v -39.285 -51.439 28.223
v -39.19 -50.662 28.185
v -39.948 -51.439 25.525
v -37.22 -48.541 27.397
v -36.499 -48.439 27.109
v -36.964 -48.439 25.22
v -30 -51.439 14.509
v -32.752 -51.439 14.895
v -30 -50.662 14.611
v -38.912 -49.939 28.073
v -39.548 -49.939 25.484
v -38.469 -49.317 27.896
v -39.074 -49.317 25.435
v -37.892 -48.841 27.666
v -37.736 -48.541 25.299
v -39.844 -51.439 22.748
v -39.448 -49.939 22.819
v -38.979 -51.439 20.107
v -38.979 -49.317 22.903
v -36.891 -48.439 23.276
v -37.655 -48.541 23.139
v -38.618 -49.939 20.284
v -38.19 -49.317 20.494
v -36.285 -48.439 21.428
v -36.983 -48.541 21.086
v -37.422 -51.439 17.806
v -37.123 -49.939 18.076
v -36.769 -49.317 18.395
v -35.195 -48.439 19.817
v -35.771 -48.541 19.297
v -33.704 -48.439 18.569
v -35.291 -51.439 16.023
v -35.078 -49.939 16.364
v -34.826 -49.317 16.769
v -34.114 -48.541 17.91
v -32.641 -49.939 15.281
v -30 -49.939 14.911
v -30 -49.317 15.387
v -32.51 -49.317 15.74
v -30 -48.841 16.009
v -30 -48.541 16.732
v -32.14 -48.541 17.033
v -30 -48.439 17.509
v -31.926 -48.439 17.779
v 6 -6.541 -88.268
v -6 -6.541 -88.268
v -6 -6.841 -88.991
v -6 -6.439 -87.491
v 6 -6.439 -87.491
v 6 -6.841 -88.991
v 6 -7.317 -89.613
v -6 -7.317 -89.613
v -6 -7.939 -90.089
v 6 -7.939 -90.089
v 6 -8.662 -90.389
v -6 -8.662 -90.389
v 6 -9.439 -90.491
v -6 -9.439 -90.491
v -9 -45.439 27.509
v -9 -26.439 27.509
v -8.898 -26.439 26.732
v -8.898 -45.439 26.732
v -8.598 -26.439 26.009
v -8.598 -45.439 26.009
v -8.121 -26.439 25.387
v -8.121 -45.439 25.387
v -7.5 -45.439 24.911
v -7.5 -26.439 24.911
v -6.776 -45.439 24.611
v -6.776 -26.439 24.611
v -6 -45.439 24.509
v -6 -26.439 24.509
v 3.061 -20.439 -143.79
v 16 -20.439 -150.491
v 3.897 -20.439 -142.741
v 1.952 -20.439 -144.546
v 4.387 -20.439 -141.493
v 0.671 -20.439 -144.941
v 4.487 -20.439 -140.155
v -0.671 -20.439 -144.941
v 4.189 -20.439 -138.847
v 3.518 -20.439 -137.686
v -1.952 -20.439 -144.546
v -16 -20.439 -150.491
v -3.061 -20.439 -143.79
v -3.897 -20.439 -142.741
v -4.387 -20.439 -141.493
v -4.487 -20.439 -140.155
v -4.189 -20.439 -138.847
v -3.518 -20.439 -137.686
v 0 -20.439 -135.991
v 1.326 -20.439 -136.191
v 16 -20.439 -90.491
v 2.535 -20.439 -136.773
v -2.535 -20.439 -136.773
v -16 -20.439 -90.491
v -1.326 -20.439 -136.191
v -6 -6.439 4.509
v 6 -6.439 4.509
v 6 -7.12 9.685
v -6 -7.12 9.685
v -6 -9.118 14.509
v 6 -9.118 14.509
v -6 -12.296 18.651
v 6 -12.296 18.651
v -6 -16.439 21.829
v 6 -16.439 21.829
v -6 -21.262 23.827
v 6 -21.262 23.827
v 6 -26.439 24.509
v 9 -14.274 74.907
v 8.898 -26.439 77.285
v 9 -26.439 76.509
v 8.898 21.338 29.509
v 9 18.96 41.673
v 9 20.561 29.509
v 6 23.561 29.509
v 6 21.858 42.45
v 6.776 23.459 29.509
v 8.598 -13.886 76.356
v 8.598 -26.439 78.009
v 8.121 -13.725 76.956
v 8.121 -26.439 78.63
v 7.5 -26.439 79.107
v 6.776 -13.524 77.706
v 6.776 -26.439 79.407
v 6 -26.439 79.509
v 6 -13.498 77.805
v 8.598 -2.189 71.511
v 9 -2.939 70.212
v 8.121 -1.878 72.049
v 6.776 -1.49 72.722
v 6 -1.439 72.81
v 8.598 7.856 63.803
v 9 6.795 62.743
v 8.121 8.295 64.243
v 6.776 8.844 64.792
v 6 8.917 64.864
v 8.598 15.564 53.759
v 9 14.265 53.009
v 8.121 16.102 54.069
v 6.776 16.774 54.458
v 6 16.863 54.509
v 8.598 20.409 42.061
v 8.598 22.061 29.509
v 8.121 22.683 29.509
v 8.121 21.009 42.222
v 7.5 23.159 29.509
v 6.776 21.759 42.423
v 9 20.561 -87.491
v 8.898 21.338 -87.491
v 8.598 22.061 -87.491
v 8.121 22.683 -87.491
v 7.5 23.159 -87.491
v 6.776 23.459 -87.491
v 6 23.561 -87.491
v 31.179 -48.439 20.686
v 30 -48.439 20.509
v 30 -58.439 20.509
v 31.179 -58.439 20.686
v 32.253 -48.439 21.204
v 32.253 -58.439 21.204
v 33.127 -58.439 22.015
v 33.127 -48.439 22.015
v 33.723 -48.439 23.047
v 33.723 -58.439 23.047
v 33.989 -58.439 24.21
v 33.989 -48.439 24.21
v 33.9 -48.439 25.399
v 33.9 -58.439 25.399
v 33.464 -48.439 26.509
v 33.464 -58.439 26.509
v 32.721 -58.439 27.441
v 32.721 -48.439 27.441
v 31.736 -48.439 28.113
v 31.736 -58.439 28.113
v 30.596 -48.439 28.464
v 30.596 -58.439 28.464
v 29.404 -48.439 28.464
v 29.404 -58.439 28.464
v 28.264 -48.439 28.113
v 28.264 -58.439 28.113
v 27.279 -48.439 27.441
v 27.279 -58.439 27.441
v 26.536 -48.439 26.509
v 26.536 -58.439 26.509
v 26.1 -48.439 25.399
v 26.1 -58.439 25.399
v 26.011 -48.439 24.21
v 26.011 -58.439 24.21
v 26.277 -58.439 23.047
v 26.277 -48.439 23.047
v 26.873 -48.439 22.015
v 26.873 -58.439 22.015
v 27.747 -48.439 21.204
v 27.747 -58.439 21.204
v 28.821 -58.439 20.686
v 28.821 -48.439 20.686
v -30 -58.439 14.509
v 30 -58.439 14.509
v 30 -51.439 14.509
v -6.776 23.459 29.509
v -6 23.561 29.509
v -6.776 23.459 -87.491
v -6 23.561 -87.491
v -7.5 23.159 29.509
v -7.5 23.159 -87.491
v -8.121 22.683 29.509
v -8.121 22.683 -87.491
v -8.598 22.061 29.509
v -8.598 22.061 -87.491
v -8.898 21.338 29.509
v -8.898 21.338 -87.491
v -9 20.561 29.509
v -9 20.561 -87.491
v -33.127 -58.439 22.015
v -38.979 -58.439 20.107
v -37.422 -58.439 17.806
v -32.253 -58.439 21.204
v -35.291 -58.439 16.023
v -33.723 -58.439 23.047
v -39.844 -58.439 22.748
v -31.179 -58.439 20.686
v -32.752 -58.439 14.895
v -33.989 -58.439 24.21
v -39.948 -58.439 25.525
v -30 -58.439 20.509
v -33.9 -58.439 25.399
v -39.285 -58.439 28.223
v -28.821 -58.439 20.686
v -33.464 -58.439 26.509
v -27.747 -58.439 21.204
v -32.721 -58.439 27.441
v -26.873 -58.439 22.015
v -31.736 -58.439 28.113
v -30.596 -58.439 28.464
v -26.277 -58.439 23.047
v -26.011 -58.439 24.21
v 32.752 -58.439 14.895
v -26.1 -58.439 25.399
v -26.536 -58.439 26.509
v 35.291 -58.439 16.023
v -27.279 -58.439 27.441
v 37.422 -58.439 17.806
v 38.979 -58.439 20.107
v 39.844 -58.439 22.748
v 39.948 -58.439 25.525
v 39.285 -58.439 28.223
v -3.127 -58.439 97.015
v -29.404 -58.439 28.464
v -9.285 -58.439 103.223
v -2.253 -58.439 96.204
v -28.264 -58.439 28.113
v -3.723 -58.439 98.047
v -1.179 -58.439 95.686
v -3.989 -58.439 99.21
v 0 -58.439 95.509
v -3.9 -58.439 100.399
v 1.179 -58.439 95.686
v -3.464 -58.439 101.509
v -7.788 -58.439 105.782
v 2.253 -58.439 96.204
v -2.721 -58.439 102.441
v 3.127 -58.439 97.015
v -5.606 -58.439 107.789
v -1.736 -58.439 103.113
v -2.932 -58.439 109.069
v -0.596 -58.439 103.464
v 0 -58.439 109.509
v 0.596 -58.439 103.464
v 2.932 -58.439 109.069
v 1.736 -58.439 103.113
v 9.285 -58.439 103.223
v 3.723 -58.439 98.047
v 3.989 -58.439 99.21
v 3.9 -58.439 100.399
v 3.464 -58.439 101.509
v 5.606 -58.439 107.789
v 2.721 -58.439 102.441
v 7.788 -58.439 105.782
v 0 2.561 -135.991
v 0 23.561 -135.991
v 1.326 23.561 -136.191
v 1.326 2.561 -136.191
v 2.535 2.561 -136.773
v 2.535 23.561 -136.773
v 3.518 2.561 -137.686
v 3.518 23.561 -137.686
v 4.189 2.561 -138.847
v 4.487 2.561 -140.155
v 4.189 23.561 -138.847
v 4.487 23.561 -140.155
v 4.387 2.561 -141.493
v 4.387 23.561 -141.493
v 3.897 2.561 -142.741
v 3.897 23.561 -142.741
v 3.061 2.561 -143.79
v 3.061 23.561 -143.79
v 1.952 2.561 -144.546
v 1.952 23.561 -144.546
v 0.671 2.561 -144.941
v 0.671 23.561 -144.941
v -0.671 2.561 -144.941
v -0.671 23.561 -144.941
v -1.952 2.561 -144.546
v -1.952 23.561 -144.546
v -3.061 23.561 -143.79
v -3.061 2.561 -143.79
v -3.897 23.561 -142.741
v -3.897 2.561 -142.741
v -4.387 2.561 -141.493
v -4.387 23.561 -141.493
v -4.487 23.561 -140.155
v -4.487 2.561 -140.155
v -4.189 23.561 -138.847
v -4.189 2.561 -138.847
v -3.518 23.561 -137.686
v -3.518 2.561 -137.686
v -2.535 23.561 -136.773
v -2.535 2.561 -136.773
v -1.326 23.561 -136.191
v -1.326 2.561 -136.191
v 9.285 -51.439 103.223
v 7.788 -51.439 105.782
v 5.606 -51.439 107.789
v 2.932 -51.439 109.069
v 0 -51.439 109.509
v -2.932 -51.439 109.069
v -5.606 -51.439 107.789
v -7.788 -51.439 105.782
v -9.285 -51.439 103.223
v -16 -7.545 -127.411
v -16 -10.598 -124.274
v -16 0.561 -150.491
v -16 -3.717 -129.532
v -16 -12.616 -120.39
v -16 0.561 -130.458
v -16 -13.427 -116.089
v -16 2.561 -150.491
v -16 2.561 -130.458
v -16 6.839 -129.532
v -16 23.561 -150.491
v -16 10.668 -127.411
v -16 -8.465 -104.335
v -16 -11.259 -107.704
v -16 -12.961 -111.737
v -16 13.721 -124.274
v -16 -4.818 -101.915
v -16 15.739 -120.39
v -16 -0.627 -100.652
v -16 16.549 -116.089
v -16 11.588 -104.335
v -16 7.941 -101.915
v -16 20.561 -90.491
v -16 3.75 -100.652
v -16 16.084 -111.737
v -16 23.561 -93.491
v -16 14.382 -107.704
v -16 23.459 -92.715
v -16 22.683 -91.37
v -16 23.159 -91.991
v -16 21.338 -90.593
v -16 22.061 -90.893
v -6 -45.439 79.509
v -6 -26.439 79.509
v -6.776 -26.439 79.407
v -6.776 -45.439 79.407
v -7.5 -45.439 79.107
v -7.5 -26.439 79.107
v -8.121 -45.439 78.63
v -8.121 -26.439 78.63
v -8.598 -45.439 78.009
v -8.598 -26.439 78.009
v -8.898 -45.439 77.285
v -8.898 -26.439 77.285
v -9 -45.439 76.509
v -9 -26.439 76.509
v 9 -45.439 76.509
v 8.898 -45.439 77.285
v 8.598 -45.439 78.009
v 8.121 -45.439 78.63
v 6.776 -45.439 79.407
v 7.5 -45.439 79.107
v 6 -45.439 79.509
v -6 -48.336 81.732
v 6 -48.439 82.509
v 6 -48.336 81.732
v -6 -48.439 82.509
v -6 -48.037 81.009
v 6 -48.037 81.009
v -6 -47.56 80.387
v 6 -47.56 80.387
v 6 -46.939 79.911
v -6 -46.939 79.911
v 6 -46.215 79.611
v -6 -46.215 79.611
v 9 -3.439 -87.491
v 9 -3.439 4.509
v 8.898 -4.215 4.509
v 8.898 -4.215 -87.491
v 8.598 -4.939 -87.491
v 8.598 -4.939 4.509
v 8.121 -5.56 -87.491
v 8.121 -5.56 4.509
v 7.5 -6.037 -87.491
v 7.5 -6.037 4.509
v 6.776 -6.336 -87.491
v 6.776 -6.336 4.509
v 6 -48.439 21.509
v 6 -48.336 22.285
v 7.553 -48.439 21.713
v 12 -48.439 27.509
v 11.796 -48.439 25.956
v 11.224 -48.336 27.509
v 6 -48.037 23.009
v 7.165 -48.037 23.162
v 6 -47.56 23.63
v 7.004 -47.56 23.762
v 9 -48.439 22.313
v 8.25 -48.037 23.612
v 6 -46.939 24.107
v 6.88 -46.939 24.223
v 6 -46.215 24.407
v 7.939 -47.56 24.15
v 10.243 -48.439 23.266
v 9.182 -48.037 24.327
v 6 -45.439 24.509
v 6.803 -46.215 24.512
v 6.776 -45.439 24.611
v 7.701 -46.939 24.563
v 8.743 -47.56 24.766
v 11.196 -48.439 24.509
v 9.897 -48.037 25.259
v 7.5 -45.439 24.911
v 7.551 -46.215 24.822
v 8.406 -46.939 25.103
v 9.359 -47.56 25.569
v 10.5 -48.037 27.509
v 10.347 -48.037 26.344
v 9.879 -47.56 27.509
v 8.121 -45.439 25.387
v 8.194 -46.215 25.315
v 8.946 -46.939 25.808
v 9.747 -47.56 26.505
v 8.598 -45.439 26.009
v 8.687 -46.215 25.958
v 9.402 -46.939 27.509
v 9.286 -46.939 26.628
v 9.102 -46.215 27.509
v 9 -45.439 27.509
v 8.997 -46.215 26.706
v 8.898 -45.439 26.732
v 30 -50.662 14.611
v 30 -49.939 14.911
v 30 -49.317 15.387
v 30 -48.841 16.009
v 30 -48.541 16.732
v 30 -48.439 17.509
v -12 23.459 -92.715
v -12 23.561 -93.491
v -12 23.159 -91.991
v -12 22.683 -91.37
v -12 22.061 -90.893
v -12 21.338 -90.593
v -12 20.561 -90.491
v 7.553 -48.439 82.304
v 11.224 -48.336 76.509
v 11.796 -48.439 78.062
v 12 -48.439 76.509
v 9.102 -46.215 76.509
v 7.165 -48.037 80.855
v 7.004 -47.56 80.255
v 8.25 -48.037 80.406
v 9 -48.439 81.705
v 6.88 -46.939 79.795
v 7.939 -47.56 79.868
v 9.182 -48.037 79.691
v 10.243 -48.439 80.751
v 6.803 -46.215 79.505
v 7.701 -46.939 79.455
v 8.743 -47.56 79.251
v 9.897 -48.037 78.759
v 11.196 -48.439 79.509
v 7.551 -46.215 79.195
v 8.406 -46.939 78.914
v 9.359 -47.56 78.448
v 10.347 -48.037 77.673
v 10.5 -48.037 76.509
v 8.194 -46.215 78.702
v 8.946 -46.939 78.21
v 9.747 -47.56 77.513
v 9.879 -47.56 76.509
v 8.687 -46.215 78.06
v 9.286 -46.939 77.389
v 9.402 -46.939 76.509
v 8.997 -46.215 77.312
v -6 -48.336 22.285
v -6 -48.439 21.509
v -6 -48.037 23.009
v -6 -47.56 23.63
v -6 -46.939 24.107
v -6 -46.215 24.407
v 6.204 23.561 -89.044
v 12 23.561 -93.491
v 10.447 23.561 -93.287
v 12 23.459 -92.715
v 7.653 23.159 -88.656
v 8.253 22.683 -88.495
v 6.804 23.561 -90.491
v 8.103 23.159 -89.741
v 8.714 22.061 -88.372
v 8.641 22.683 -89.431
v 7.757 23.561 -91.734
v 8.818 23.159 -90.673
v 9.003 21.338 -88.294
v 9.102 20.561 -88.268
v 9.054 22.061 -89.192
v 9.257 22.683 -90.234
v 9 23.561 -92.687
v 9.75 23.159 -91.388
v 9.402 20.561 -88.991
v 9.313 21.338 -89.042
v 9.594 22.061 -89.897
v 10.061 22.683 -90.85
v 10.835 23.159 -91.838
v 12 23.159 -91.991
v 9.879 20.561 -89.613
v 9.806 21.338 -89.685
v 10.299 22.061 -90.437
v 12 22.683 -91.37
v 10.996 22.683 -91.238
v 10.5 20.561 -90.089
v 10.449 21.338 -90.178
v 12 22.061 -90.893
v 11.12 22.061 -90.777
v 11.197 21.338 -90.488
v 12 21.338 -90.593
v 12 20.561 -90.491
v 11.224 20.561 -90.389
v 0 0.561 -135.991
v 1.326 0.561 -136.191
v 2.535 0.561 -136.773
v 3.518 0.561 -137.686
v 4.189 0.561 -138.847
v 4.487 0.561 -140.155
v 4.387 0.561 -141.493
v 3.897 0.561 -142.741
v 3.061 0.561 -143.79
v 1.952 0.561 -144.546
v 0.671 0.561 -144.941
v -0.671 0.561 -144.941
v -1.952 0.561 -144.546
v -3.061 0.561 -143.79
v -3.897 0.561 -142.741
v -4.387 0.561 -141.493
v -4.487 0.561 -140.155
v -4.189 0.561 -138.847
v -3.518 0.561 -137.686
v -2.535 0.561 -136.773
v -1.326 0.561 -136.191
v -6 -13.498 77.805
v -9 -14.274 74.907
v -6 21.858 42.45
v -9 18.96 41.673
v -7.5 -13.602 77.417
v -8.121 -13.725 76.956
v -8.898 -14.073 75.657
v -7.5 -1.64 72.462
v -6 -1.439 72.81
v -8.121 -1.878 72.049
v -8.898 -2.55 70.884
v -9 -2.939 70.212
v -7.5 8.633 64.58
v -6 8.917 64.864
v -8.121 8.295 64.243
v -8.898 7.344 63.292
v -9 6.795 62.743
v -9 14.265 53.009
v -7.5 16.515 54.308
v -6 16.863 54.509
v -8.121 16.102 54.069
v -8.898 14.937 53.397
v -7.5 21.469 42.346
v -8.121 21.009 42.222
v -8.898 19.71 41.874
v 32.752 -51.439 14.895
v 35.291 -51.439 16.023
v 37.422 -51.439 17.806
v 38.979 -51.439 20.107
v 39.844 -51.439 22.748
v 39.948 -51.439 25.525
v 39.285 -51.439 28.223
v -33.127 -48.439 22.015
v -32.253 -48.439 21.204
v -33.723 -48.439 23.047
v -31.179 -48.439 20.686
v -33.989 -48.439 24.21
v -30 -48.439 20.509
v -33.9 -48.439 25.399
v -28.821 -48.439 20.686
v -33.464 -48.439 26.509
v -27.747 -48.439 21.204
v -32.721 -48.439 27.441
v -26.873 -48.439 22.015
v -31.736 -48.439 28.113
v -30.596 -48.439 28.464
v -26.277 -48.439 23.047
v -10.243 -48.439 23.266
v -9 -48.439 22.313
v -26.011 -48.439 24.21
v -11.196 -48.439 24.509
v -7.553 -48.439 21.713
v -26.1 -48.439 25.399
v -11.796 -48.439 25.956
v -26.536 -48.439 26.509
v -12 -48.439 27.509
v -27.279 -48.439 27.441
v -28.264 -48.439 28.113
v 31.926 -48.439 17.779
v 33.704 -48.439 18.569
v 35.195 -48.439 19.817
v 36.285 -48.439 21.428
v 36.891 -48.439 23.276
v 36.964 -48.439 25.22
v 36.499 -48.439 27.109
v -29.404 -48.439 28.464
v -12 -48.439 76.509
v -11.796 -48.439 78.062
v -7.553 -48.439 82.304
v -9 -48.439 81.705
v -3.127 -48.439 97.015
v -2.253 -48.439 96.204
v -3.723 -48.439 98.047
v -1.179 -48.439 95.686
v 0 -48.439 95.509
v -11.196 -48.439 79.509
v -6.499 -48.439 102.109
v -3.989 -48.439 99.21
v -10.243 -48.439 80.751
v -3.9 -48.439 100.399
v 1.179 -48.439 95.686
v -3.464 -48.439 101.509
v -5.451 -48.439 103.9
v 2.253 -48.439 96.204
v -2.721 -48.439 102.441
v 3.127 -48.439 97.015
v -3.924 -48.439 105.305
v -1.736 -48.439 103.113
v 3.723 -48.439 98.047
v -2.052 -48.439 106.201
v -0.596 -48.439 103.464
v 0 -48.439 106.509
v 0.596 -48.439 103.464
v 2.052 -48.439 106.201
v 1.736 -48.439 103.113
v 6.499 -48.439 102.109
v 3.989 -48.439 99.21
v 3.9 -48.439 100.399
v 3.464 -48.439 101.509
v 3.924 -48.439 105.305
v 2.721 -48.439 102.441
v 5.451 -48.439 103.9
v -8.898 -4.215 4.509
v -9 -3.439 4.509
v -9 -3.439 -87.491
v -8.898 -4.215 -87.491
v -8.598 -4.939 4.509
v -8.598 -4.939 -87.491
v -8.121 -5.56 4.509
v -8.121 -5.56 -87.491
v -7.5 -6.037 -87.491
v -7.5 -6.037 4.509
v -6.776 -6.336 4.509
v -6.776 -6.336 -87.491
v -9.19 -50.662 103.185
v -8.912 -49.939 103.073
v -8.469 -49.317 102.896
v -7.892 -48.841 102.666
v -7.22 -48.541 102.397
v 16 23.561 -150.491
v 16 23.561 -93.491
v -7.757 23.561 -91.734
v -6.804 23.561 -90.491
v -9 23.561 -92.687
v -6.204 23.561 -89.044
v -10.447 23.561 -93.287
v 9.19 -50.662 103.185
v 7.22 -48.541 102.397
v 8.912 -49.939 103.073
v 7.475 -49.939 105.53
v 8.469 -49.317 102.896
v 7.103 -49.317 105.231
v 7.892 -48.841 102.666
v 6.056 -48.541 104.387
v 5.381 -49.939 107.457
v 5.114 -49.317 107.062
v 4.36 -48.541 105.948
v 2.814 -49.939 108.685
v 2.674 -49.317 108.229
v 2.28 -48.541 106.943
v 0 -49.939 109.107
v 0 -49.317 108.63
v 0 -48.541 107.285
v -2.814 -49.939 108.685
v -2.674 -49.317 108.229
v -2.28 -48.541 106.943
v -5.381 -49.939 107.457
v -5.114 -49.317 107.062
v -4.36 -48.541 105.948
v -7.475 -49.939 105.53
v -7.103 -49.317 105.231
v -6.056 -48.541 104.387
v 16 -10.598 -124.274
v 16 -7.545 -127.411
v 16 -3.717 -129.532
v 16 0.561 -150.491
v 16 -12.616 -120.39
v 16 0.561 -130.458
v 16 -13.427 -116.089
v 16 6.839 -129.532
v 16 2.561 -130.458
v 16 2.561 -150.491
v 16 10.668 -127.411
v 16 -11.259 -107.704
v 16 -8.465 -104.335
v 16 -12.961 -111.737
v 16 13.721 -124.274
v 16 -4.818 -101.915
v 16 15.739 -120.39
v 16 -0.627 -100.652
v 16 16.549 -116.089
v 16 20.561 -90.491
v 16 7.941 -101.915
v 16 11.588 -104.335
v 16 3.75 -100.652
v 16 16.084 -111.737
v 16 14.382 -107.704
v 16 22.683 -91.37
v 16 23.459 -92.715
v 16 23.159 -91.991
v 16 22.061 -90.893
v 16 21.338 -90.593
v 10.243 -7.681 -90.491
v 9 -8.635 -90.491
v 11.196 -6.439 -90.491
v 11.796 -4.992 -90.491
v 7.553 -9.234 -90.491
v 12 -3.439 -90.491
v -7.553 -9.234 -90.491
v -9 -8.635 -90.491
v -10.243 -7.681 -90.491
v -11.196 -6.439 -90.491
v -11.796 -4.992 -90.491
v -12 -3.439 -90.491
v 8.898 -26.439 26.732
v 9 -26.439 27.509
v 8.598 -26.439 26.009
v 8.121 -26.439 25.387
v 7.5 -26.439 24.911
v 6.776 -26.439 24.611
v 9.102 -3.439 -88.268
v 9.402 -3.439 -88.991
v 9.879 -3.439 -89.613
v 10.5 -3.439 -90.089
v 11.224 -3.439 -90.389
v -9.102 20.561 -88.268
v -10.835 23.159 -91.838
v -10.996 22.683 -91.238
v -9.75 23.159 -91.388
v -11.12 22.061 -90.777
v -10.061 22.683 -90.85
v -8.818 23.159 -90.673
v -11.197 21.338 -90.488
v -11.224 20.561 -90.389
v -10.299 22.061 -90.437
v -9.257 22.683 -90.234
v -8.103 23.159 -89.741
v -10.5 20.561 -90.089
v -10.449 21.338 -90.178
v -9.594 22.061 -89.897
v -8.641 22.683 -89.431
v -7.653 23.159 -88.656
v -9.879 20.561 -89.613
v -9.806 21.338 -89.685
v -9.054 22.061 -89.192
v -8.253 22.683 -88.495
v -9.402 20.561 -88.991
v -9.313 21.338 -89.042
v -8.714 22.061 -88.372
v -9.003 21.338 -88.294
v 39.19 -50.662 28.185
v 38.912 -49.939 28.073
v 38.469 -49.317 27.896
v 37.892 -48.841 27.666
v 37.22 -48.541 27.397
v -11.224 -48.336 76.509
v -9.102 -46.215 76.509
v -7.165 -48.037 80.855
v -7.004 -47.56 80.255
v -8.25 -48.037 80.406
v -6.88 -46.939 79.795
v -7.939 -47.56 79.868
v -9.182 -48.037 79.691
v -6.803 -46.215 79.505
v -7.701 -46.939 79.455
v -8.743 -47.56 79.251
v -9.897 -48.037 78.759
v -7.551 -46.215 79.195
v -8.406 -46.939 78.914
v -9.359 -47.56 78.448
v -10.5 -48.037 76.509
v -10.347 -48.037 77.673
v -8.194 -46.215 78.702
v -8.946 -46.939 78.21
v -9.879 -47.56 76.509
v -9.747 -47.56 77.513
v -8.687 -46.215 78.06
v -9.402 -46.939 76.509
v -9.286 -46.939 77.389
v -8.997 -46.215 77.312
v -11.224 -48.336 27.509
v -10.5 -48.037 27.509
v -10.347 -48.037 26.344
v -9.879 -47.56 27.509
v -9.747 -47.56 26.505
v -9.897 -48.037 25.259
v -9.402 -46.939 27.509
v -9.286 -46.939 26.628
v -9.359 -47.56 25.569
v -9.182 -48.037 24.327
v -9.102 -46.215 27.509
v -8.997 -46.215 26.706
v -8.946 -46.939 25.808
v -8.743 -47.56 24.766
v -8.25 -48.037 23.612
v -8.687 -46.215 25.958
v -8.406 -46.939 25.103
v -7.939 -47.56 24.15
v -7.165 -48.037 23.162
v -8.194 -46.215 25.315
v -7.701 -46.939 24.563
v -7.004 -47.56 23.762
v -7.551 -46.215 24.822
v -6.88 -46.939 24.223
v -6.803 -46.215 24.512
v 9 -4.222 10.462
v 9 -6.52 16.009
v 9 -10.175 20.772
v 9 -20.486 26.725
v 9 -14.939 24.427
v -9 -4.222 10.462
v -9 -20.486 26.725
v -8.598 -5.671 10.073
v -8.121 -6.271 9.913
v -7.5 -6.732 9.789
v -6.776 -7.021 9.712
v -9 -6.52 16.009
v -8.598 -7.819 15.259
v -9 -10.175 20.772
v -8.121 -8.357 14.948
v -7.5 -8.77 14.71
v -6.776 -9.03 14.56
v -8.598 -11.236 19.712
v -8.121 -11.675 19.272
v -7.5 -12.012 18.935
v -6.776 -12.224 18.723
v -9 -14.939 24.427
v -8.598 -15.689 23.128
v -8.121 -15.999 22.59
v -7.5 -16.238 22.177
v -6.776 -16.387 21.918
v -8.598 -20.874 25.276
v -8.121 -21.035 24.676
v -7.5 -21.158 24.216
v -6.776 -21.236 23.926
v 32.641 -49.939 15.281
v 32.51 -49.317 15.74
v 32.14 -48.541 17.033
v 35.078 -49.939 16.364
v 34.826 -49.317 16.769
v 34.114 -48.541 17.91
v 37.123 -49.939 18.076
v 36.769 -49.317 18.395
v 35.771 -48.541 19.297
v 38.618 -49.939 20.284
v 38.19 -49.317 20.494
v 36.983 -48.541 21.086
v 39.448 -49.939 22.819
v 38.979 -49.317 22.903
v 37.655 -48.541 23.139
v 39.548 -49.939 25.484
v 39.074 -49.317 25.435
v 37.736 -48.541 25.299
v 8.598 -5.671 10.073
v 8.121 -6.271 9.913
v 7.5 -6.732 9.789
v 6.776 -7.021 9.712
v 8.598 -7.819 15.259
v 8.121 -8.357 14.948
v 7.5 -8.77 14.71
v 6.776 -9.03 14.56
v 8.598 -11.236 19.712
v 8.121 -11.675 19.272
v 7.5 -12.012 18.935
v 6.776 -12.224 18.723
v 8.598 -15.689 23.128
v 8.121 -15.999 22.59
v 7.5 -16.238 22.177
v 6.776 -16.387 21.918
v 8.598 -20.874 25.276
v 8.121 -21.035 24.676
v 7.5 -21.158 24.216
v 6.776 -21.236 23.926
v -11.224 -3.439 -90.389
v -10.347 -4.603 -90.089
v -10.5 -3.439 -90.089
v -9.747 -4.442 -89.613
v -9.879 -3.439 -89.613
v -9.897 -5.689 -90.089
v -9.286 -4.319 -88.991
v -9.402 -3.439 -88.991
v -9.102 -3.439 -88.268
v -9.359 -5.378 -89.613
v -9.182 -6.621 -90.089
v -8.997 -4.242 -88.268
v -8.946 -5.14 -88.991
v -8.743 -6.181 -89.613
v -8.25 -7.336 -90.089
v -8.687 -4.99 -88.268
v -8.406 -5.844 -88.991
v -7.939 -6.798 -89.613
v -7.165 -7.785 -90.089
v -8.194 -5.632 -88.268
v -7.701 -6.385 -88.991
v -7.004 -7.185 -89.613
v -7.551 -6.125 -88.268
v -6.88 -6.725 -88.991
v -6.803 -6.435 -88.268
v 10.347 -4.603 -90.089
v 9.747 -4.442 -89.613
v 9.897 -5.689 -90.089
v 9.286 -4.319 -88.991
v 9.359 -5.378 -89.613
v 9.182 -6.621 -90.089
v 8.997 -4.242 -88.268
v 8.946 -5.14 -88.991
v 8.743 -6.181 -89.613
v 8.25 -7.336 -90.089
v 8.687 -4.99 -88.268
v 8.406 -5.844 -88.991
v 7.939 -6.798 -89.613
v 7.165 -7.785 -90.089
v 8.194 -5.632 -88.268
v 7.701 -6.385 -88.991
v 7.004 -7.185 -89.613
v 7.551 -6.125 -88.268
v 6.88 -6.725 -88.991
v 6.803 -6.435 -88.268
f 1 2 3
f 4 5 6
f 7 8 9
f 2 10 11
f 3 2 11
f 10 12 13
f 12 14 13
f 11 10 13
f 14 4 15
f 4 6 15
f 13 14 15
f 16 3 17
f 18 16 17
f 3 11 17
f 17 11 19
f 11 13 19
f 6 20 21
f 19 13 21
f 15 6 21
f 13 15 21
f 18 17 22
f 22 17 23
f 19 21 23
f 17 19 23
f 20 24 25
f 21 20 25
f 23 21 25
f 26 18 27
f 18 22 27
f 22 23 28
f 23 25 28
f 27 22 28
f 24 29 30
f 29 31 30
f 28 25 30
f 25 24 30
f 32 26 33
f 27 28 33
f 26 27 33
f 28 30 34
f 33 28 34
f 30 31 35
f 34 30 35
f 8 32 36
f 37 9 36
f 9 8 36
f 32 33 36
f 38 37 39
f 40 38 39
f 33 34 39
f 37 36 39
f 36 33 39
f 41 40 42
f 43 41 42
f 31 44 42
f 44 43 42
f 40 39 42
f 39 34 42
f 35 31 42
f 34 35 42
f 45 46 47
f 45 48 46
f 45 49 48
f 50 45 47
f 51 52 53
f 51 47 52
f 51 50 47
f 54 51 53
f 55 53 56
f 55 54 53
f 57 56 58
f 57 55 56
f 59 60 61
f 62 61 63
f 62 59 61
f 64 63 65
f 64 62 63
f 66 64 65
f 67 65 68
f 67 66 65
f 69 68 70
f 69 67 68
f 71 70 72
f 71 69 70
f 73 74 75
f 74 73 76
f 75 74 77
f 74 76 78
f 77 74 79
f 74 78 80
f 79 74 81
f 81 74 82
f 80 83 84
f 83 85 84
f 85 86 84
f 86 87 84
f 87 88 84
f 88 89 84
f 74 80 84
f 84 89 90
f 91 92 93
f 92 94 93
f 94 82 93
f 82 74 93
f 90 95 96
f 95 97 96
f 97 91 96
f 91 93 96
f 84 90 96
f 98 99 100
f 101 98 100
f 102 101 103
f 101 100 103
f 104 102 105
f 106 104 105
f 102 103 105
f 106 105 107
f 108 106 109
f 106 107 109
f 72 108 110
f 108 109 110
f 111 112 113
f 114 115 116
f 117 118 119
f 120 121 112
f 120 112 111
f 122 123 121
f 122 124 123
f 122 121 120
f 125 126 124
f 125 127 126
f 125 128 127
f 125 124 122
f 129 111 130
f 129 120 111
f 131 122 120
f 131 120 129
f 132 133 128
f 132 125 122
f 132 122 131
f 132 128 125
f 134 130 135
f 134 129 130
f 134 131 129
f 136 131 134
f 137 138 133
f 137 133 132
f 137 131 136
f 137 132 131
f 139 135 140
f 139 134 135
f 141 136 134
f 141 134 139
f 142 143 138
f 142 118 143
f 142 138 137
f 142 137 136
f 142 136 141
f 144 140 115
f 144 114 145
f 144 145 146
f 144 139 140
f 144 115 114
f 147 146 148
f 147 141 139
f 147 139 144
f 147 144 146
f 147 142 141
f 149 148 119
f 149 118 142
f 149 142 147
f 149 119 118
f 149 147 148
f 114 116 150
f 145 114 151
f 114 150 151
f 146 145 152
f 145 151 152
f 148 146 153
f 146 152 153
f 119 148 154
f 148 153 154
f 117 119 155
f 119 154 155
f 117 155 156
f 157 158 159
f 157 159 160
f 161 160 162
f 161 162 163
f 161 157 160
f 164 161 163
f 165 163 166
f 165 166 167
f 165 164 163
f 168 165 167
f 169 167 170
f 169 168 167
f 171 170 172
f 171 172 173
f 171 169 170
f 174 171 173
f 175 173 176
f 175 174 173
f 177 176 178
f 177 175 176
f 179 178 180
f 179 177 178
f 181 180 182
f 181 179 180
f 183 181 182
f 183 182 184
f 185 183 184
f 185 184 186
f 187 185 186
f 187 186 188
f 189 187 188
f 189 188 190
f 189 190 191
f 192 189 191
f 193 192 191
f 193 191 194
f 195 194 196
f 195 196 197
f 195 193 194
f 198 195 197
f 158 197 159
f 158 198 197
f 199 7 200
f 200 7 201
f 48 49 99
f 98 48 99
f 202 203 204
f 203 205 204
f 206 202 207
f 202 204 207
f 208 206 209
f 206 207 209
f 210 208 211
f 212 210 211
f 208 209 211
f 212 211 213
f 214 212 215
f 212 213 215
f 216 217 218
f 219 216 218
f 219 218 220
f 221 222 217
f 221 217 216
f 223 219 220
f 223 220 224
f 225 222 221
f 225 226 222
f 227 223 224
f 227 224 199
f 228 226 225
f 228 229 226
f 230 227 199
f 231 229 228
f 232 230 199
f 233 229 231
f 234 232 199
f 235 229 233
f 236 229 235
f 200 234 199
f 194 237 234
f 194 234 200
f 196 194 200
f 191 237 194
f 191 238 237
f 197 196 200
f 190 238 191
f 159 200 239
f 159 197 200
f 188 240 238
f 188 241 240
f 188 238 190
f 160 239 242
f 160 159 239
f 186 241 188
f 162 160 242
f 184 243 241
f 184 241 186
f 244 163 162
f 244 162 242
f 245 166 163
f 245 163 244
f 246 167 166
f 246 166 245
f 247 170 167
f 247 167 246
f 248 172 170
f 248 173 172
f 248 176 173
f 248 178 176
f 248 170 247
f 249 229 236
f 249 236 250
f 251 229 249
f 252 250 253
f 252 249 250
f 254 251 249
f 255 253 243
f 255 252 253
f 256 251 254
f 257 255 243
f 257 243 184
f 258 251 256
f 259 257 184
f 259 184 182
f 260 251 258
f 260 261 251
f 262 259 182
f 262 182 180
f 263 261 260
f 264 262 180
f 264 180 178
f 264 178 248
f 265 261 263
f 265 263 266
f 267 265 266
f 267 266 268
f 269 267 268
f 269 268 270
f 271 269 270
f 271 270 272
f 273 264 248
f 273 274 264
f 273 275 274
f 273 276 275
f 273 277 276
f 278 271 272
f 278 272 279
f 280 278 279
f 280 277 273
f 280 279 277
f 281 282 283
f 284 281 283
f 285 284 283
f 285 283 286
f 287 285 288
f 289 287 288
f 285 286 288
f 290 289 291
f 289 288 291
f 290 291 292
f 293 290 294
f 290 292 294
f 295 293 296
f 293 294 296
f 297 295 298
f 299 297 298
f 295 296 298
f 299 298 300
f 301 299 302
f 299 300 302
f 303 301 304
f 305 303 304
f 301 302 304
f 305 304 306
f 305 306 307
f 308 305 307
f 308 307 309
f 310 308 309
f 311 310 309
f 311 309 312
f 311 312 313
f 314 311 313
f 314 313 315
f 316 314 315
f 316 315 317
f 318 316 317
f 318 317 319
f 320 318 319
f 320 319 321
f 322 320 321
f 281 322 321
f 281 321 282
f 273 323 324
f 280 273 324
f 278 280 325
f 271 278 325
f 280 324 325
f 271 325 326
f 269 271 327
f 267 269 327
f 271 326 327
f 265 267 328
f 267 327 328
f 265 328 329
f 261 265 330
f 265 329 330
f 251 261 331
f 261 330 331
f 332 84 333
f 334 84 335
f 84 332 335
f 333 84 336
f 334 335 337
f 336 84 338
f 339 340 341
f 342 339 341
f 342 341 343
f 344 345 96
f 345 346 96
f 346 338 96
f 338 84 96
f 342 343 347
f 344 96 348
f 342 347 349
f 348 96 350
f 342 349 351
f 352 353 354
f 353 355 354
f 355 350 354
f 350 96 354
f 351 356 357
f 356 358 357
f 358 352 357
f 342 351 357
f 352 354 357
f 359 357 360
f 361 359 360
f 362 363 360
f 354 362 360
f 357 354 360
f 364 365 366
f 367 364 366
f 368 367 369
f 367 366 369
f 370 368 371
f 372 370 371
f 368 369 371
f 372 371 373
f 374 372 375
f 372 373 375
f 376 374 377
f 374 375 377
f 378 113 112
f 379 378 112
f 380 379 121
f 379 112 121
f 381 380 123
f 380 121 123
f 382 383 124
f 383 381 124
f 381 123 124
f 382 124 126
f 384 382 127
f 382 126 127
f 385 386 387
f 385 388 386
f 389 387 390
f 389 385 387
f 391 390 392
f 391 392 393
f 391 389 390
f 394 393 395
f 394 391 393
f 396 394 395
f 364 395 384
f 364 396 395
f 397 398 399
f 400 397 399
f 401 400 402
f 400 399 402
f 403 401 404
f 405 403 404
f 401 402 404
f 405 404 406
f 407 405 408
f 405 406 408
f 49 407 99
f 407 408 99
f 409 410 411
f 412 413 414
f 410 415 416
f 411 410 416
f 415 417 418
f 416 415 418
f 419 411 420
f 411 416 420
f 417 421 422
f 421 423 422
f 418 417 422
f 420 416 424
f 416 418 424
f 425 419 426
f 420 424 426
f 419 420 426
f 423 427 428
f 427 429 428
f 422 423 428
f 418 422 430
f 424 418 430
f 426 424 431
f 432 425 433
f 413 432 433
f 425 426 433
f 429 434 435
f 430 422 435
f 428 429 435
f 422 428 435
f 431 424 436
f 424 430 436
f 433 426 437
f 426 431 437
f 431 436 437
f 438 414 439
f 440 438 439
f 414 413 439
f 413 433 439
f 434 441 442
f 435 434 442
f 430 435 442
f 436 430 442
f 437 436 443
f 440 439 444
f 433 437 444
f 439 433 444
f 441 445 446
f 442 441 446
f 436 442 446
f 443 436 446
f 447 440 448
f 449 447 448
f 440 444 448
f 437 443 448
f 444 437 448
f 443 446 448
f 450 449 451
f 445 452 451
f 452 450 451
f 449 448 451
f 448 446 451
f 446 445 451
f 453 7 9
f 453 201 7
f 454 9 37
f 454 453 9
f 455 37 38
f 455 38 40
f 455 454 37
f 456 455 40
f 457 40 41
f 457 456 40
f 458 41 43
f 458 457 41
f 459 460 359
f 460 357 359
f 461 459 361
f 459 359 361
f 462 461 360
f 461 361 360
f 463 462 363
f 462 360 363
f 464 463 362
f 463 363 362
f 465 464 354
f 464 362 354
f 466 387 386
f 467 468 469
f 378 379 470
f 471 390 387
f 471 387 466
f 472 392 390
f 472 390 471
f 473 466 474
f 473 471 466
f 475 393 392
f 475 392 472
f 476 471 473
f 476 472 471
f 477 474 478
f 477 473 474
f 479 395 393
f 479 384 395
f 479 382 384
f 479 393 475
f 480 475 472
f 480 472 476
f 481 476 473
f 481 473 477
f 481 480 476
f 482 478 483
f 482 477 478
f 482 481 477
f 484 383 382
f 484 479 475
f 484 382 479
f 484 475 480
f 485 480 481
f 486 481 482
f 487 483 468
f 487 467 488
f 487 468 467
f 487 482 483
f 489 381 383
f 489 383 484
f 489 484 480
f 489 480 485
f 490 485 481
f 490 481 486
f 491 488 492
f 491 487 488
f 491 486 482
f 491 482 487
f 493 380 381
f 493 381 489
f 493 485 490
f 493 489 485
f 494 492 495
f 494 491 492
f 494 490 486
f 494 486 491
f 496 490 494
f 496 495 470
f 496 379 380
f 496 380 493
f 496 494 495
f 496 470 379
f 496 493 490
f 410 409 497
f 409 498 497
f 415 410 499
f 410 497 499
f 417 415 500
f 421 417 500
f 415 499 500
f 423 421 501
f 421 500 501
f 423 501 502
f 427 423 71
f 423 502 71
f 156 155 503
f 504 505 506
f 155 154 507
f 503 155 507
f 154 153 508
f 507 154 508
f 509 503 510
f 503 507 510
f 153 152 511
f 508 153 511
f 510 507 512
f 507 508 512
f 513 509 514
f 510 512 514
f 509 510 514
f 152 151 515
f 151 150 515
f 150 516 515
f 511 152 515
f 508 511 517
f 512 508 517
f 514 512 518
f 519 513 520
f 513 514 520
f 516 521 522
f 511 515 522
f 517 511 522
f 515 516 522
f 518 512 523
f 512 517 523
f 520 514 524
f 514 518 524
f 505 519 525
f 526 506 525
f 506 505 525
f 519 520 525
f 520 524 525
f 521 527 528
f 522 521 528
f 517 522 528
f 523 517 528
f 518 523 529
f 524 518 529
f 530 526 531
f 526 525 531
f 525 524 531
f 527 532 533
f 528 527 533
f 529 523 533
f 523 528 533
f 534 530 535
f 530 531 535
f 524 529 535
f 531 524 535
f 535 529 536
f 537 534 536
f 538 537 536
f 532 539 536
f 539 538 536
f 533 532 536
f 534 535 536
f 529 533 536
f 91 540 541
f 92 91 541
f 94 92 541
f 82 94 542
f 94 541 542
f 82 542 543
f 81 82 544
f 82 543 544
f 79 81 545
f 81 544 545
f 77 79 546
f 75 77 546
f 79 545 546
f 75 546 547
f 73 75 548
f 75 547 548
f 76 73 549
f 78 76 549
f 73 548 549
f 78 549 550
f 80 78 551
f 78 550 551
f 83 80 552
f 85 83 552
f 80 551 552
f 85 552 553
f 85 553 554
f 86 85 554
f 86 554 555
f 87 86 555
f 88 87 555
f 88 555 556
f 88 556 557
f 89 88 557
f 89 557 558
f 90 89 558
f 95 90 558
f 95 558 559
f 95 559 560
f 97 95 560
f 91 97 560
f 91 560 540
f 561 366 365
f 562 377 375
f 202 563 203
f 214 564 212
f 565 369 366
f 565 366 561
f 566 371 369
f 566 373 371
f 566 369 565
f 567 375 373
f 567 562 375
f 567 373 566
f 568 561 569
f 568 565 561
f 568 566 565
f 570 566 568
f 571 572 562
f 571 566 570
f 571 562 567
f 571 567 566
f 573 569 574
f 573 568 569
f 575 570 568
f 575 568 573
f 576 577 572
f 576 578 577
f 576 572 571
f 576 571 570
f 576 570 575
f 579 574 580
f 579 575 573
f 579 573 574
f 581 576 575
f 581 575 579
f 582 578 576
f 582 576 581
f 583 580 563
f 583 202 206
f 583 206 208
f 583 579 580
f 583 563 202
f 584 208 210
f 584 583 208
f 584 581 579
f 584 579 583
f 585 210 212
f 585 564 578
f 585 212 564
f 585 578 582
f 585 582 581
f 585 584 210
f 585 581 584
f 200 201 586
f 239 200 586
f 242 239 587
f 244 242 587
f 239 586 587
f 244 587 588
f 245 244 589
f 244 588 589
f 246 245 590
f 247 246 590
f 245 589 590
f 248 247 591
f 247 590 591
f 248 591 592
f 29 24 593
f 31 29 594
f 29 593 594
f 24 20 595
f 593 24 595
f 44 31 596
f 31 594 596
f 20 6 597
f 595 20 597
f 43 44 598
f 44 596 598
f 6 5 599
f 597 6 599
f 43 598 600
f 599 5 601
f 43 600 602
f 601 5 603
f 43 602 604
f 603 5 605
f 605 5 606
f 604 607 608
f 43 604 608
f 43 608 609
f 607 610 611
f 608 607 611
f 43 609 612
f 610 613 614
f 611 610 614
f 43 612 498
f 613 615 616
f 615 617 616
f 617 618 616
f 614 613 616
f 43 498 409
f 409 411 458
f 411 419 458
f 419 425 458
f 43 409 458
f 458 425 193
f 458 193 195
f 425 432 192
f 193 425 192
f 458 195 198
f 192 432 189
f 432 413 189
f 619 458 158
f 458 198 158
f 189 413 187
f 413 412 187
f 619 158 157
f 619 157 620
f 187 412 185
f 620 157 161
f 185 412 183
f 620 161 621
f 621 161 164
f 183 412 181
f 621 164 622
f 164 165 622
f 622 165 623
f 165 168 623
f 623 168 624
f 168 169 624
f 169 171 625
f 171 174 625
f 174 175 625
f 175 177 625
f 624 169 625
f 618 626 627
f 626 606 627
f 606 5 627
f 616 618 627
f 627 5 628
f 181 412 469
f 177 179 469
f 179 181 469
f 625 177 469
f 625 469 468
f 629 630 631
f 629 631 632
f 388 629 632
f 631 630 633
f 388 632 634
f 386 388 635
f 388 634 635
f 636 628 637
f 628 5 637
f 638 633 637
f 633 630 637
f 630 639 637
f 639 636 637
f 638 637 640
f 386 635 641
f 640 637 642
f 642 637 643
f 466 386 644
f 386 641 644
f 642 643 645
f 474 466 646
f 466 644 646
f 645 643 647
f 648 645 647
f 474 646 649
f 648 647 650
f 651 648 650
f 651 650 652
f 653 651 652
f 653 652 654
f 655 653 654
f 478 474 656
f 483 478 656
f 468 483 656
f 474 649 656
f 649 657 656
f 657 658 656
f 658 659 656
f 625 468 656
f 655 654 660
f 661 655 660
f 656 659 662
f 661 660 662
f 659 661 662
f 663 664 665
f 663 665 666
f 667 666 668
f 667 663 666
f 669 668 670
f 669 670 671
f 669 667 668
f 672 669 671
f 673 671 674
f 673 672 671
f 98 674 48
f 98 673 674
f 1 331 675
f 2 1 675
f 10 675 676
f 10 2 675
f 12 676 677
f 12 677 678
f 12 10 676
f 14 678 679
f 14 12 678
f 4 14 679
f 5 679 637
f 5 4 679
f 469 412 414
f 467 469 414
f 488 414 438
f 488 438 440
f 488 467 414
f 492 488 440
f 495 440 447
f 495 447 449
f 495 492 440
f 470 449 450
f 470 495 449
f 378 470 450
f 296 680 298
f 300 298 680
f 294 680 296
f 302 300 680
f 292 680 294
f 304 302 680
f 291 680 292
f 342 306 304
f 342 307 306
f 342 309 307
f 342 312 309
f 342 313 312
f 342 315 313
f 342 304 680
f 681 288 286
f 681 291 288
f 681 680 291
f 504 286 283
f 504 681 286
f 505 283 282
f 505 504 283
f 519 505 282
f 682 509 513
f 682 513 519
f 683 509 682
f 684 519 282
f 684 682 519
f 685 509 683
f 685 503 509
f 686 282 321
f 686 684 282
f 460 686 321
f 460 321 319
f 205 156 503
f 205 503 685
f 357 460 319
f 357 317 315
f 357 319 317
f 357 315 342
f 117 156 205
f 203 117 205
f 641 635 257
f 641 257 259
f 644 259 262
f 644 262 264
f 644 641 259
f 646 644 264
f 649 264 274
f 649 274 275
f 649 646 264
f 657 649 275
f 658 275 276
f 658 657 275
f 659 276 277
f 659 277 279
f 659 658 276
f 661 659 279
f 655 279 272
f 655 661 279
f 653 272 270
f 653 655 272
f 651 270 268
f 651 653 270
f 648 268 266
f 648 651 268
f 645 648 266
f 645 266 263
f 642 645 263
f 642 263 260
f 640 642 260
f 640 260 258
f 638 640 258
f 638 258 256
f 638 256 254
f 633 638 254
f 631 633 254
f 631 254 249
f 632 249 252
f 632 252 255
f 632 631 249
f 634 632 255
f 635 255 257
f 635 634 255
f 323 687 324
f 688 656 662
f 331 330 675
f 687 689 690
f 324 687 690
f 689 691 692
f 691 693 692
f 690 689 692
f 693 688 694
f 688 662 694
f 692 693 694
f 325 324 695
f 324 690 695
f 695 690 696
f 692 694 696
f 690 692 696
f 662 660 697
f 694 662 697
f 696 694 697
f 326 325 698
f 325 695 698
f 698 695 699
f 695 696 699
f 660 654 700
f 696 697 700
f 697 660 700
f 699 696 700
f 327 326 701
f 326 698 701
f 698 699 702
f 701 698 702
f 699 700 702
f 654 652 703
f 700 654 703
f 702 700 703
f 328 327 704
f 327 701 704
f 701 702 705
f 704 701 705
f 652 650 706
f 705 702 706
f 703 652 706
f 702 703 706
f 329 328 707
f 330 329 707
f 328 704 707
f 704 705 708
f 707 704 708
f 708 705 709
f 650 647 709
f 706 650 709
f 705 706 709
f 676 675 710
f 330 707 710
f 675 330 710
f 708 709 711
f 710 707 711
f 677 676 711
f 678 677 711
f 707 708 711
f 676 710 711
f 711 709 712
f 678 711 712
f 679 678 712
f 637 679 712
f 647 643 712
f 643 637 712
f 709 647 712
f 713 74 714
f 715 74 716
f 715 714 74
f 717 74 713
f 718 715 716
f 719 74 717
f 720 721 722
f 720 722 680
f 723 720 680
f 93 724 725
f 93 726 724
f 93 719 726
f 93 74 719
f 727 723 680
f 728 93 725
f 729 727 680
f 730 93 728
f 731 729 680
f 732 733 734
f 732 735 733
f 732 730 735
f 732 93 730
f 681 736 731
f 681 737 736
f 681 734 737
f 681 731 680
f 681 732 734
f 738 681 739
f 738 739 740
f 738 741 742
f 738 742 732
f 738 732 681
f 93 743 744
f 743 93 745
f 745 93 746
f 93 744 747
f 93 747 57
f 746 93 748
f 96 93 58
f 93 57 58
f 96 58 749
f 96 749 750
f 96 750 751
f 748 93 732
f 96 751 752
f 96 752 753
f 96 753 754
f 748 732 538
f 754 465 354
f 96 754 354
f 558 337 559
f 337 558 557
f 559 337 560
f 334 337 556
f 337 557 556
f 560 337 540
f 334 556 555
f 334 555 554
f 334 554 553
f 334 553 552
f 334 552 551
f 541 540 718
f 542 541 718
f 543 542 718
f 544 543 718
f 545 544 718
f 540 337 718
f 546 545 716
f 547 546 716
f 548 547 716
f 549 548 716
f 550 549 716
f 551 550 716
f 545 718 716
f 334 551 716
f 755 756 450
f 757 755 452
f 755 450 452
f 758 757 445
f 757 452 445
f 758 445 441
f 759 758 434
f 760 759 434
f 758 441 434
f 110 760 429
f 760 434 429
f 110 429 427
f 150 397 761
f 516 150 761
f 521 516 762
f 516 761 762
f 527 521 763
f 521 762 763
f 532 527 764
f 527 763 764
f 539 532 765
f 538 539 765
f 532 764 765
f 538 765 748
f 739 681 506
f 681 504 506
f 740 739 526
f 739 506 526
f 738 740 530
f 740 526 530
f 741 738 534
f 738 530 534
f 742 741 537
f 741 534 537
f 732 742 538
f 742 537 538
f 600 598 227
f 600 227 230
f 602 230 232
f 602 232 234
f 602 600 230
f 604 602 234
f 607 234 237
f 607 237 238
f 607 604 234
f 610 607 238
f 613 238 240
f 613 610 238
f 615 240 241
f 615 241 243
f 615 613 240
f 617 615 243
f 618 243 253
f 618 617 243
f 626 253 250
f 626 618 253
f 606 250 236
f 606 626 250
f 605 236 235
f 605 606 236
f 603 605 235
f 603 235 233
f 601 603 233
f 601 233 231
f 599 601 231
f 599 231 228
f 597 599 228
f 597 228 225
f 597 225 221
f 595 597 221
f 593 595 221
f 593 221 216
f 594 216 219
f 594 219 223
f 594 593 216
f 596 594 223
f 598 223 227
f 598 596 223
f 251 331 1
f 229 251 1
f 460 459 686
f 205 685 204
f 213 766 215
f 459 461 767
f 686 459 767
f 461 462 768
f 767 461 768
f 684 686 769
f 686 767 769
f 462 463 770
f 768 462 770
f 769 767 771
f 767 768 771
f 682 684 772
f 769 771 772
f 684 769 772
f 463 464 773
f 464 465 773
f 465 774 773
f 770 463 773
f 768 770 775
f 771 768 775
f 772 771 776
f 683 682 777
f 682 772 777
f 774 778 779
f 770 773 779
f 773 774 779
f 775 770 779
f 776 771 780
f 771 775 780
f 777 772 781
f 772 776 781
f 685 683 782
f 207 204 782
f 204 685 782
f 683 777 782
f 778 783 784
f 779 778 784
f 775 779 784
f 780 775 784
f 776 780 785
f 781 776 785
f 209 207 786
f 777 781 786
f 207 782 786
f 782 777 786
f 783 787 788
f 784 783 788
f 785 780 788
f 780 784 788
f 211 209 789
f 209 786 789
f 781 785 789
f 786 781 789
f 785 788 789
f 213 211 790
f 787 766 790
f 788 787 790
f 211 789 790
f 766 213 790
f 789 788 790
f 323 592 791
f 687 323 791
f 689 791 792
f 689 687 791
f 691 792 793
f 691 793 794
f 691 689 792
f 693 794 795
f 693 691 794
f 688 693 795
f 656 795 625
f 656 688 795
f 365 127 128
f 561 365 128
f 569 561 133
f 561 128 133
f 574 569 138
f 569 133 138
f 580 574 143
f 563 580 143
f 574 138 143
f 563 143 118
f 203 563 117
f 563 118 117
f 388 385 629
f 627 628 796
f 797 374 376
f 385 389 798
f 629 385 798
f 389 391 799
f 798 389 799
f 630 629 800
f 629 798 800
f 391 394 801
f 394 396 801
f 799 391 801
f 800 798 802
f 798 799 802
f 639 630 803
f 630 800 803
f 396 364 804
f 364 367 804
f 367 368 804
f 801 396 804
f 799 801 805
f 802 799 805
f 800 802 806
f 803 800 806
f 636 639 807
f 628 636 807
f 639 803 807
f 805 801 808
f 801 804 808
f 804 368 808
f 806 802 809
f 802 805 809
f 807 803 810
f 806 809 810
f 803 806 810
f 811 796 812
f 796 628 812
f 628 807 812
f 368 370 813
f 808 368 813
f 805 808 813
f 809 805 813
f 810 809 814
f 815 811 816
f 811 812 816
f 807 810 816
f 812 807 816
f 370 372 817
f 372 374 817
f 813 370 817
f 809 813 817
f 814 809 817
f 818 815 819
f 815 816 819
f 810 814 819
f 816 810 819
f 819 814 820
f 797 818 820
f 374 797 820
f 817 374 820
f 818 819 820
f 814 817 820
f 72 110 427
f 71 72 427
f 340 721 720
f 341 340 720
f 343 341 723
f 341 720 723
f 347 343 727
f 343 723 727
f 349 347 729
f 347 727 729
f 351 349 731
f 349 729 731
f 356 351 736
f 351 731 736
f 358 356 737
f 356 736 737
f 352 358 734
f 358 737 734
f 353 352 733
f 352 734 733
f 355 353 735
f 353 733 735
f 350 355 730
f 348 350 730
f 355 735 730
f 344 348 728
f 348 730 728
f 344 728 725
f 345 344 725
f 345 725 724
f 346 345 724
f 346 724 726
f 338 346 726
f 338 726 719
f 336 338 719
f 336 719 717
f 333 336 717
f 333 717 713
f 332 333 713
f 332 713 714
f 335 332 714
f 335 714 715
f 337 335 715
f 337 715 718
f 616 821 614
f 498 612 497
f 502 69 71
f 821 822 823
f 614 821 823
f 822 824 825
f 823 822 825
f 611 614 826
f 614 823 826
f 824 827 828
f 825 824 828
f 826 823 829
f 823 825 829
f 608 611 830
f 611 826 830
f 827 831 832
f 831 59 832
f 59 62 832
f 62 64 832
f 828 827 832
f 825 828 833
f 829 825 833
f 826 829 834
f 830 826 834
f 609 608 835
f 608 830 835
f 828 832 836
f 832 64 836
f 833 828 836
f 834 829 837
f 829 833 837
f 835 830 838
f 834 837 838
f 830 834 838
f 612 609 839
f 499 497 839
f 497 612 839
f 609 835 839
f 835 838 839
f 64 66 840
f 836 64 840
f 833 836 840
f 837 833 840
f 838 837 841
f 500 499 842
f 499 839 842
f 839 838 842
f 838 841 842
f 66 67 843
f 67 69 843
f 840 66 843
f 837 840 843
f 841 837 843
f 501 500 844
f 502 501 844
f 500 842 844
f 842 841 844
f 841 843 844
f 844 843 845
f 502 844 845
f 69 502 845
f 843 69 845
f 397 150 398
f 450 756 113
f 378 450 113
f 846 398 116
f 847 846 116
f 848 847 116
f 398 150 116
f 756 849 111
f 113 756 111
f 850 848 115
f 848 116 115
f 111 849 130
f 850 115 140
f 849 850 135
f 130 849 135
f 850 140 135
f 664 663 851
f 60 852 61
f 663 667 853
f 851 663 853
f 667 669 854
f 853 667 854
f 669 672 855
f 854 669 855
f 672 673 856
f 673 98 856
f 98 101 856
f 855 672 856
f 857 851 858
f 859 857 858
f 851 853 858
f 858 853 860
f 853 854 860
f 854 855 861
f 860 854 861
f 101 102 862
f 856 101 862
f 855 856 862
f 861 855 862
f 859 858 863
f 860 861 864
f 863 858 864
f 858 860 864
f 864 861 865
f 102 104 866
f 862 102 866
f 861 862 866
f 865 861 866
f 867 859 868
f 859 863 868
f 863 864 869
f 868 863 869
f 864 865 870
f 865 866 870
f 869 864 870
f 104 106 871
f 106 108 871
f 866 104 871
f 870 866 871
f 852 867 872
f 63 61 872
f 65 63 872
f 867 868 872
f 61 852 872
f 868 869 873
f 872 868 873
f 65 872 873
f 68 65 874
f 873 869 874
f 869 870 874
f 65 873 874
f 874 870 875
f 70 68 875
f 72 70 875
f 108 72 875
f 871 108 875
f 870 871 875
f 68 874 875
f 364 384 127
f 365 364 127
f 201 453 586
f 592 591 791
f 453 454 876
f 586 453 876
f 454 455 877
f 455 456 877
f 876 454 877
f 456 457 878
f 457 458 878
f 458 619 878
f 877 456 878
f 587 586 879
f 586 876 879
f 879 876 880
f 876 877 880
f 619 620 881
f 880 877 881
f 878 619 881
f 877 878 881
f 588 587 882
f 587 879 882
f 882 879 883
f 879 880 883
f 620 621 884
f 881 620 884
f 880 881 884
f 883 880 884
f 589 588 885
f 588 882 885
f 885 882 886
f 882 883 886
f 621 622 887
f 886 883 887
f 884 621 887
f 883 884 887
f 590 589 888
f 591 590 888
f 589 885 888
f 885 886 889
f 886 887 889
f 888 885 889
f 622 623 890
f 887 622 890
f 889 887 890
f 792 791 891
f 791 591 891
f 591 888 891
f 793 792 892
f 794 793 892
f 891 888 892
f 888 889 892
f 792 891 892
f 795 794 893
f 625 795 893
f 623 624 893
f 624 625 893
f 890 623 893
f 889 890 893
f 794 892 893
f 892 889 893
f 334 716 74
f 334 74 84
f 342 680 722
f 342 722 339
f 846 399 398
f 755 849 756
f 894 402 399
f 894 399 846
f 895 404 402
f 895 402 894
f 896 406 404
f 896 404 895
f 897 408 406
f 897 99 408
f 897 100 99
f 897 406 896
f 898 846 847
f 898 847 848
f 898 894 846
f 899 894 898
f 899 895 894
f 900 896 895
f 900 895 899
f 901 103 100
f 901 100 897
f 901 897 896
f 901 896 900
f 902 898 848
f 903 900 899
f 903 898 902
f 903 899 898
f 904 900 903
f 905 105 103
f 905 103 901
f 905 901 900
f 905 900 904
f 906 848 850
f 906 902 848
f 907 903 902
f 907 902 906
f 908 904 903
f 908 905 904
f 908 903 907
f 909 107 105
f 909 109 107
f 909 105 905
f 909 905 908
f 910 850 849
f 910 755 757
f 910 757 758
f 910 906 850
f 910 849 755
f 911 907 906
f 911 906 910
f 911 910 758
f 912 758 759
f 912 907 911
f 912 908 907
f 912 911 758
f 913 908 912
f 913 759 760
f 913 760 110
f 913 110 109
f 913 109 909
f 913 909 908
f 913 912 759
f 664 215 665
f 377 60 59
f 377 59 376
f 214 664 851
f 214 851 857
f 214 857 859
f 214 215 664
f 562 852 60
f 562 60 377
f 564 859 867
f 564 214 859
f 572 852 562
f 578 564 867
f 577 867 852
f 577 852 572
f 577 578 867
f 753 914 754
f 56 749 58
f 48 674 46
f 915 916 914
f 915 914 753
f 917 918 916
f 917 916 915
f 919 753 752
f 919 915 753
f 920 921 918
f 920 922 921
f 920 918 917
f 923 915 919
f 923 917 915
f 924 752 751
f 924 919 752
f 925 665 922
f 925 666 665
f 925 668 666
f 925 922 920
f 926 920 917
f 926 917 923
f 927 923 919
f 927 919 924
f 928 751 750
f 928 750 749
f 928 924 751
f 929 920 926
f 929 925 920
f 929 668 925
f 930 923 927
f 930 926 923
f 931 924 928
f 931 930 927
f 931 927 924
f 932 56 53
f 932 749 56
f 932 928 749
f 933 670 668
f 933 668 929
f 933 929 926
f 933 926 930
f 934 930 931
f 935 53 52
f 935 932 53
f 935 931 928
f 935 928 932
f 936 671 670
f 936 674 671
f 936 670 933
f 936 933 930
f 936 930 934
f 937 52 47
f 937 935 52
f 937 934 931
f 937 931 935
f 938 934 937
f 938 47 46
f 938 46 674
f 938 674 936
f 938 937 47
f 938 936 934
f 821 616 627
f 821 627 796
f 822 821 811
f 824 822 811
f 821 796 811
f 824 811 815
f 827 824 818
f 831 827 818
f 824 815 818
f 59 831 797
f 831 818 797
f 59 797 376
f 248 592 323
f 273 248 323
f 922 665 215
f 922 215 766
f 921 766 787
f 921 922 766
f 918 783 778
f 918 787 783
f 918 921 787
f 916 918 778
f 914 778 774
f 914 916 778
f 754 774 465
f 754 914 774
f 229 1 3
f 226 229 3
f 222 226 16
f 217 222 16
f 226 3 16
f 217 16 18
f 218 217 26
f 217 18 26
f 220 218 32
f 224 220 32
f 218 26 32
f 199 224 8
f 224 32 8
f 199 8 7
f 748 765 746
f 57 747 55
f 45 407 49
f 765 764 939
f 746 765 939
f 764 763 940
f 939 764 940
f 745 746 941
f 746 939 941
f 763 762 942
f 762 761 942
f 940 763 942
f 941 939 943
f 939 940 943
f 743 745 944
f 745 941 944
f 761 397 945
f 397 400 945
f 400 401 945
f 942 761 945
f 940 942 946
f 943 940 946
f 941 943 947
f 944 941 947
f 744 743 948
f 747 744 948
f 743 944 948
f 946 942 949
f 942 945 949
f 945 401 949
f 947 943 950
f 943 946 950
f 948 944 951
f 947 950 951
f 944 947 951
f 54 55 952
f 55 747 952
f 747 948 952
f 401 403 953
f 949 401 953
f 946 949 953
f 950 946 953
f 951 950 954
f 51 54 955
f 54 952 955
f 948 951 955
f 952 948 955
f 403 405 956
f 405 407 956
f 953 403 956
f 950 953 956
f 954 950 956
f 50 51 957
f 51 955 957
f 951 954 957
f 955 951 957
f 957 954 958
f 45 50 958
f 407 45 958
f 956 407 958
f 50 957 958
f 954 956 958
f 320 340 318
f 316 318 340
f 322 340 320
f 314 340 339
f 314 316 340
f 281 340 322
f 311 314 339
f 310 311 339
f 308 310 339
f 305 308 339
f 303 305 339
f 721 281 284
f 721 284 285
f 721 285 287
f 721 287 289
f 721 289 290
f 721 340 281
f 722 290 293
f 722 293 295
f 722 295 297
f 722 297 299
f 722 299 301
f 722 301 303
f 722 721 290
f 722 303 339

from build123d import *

# Parameters (mm, degrees)
BOSS_EXTRUDE1_DEPTH = 9
SKETCH2_W           = 32
SKETCH2_H           = 44
BOSS_EXTRUDE2_DEPTH = 60
SKETCH3_R           = 15
CUT_EXTRUDE1_DEPTH  = 60
SKETCH4_W           = 34.378885512
SKETCH4_H           = 2
CUT_EXTRUDE2_DEPTH  = 162.300673762
SKETCH5_R           = 4.5
CUT_EXTRUDE3_DEPTH  = 168.593584979
SKETCH6_R           = 4
BOSS_EXTRUDE3_DEPTH = 10
FILLET1_R           = 3


with BuildPart() as part:
    # Sketch1 → Boss-Extrude1 (new, symmetric)
    with BuildSketch(Plane(origin=(0, 0, 0), x_dir=(0, 0, -1), z_dir=(1, 0, 0))):
        with BuildLine():
            Line((90.49122807, -6.438596491), (-4.50877193, -6.438596491))
            ThreePointArc((-4.50877193, -6.438596491), (-18.650907554, -12.296460867), (-24.50877193, -26.438596491))
            Line((-24.50877193, -26.438596491), (-24.50877193, -48.438596491))
            Line((-24.50877193, -48.438596491), (-79.50877193, -48.438596491))
            Line((-79.50877193, -48.438596491), (-79.50877193, -37.438596491))
            Line((-79.50877193, -37.438596491), (-79.50877193, -26.438596491))
            ThreePointArc((-79.50877193, -26.438596491), (-64.864110989, 8.916742568), (-29.50877193, 23.561403509))
            Line((-29.50877193, 23.561403509), (90.49122807, 23.561403509))
            Line((90.49122807, 23.561403509), (90.49122807, -6.438596491))
        make_face()
    extrude(amount=BOSS_EXTRUDE1_DEPTH, both=True)

    # Sketch2 → Boss-Extrude2 (add)
    with BuildSketch(Plane(origin=(0, 0, -90.49122807), x_dir=(-1, 0, 0), z_dir=(0, 0, -1))):
        with Locations((0, 1.561403509)):
            Rectangle(SKETCH2_W, SKETCH2_H)
    extrude(amount=BOSS_EXTRUDE2_DEPTH)

    # Sketch3 → Cut-Extrude1 (cut)
    with BuildSketch(Plane(origin=(16, 0, 0), x_dir=(0, 0, -1), z_dir=(1, 0, 0))):
        with Locations((115.49122807, 1.561403509)):
            Circle(SKETCH3_R)
    extrude(amount=-CUT_EXTRUDE1_DEPTH, mode=Mode.SUBTRACT)

    # Sketch4 → Cut-Extrude2 (cut, through all)
    with BuildSketch(Plane(origin=(16, 0, 0), x_dir=(0, 0, -1), z_dir=(1, 0, 0))):
        with Locations((143.677522108, 1.561403509)):
            Rectangle(SKETCH4_W, SKETCH4_H)
    extrude(amount=-CUT_EXTRUDE2_DEPTH, mode=Mode.SUBTRACT)

    # Sketch5 → Cut-Extrude3 (cut, through all)
    with BuildSketch(Plane(origin=(0, 23.561403509, 0), x_dir=(1, 0, 0), z_dir=(0, 1, 0))):
        with Locations(Location((0, 140.49122807, 0), (0, 0, 270))):
            Circle(SKETCH5_R)
    extrude(amount=-CUT_EXTRUDE3_DEPTH, mode=Mode.SUBTRACT)

    # Sketch6 → Boss-Extrude3 (add)
    with BuildSketch(Plane.XZ.offset(48.438596491)):
        with BuildLine():
            Line((-30, 14.50877193), (30, 14.50877193))
            ThreePointArc((30, 14.50877193), (38.280672305, 18.902483837), (39.284766909, 28.222678693))
            Line((39.284766909, 28.222678693), (9.284766909, 103.222678693))
            ThreePointArc((9.284766909, 103.222678693), (0, 109.50877193), (-9.284766909, 103.222678693))
            Line((-9.284766909, 103.222678693), (-39.284766909, 28.222678693))
            ThreePointArc((-39.284766909, 28.222678693), (-38.280672305, 18.902483837), (-30, 14.50877193))
        make_face()
        with Locations(Location((30, 24.50877193, 0), (0, 0, 270))):
            Circle(SKETCH6_R, mode=Mode.SUBTRACT)
        with Locations(Location((-30, 24.50877193, 0), (0, 0, 270))):
            Circle(SKETCH6_R, mode=Mode.SUBTRACT)
        with Locations(Location((0, 99.50877193, 0), (0, 0, 270))):
            Circle(SKETCH6_R, mode=Mode.SUBTRACT)
    extrude(amount=BOSS_EXTRUDE3_DEPTH)

    # Fillet1
    fillet1_edges = [part.edges().sort_by_distance(p)[0] for p in [
        (9, 8.916742568, 64.864110989),
        (-9, -37.438596491, 79.50877193),
        (-9, 8.916742568, 64.864110989),
        (-9, 23.561403509, -30.49122807),
        (-9, 8.561403509, -90.49122807),
        (-38.280672305, -48.438596491, 18.902483837),
        (0, -48.438596491, 14.50877193),
        (38.280672305, -48.438596491, 18.902483837),
        (24.284766909, -48.438596491, 65.722678693),
        (0, -48.438596491, 109.50877193),
        (-24.284766909, -48.438596491, 65.722678693),
        (9, -37.438596491, 79.50877193),
        (0, -6.438596491, -90.49122807),
        (0, -48.438596491, 24.50877193),
        (0, -48.438596491, 79.50877193),
        (9, -48.438596491, 52.00877193),
        (9, -37.438596491, 24.50877193),
        (9, -12.296460867, 18.650907554),
        (9, -6.438596491, -42.99122807),
        (-12.5, 23.561403509, -90.49122807),
        (12.5, 23.561403509, -90.49122807),
        (9, 8.561403509, -90.49122807),
        (9, 23.561403509, -30.49122807),
        (-9, -6.438596491, -42.99122807),
        (-9, -12.296460867, 18.650907554),
        (-9, -37.438596491, 24.50877193),
        (-9, -48.438596491, 52.00877193),
    ]]
    fillet(fillet1_edges, radius=FILLET1_R)


solid = part.part
